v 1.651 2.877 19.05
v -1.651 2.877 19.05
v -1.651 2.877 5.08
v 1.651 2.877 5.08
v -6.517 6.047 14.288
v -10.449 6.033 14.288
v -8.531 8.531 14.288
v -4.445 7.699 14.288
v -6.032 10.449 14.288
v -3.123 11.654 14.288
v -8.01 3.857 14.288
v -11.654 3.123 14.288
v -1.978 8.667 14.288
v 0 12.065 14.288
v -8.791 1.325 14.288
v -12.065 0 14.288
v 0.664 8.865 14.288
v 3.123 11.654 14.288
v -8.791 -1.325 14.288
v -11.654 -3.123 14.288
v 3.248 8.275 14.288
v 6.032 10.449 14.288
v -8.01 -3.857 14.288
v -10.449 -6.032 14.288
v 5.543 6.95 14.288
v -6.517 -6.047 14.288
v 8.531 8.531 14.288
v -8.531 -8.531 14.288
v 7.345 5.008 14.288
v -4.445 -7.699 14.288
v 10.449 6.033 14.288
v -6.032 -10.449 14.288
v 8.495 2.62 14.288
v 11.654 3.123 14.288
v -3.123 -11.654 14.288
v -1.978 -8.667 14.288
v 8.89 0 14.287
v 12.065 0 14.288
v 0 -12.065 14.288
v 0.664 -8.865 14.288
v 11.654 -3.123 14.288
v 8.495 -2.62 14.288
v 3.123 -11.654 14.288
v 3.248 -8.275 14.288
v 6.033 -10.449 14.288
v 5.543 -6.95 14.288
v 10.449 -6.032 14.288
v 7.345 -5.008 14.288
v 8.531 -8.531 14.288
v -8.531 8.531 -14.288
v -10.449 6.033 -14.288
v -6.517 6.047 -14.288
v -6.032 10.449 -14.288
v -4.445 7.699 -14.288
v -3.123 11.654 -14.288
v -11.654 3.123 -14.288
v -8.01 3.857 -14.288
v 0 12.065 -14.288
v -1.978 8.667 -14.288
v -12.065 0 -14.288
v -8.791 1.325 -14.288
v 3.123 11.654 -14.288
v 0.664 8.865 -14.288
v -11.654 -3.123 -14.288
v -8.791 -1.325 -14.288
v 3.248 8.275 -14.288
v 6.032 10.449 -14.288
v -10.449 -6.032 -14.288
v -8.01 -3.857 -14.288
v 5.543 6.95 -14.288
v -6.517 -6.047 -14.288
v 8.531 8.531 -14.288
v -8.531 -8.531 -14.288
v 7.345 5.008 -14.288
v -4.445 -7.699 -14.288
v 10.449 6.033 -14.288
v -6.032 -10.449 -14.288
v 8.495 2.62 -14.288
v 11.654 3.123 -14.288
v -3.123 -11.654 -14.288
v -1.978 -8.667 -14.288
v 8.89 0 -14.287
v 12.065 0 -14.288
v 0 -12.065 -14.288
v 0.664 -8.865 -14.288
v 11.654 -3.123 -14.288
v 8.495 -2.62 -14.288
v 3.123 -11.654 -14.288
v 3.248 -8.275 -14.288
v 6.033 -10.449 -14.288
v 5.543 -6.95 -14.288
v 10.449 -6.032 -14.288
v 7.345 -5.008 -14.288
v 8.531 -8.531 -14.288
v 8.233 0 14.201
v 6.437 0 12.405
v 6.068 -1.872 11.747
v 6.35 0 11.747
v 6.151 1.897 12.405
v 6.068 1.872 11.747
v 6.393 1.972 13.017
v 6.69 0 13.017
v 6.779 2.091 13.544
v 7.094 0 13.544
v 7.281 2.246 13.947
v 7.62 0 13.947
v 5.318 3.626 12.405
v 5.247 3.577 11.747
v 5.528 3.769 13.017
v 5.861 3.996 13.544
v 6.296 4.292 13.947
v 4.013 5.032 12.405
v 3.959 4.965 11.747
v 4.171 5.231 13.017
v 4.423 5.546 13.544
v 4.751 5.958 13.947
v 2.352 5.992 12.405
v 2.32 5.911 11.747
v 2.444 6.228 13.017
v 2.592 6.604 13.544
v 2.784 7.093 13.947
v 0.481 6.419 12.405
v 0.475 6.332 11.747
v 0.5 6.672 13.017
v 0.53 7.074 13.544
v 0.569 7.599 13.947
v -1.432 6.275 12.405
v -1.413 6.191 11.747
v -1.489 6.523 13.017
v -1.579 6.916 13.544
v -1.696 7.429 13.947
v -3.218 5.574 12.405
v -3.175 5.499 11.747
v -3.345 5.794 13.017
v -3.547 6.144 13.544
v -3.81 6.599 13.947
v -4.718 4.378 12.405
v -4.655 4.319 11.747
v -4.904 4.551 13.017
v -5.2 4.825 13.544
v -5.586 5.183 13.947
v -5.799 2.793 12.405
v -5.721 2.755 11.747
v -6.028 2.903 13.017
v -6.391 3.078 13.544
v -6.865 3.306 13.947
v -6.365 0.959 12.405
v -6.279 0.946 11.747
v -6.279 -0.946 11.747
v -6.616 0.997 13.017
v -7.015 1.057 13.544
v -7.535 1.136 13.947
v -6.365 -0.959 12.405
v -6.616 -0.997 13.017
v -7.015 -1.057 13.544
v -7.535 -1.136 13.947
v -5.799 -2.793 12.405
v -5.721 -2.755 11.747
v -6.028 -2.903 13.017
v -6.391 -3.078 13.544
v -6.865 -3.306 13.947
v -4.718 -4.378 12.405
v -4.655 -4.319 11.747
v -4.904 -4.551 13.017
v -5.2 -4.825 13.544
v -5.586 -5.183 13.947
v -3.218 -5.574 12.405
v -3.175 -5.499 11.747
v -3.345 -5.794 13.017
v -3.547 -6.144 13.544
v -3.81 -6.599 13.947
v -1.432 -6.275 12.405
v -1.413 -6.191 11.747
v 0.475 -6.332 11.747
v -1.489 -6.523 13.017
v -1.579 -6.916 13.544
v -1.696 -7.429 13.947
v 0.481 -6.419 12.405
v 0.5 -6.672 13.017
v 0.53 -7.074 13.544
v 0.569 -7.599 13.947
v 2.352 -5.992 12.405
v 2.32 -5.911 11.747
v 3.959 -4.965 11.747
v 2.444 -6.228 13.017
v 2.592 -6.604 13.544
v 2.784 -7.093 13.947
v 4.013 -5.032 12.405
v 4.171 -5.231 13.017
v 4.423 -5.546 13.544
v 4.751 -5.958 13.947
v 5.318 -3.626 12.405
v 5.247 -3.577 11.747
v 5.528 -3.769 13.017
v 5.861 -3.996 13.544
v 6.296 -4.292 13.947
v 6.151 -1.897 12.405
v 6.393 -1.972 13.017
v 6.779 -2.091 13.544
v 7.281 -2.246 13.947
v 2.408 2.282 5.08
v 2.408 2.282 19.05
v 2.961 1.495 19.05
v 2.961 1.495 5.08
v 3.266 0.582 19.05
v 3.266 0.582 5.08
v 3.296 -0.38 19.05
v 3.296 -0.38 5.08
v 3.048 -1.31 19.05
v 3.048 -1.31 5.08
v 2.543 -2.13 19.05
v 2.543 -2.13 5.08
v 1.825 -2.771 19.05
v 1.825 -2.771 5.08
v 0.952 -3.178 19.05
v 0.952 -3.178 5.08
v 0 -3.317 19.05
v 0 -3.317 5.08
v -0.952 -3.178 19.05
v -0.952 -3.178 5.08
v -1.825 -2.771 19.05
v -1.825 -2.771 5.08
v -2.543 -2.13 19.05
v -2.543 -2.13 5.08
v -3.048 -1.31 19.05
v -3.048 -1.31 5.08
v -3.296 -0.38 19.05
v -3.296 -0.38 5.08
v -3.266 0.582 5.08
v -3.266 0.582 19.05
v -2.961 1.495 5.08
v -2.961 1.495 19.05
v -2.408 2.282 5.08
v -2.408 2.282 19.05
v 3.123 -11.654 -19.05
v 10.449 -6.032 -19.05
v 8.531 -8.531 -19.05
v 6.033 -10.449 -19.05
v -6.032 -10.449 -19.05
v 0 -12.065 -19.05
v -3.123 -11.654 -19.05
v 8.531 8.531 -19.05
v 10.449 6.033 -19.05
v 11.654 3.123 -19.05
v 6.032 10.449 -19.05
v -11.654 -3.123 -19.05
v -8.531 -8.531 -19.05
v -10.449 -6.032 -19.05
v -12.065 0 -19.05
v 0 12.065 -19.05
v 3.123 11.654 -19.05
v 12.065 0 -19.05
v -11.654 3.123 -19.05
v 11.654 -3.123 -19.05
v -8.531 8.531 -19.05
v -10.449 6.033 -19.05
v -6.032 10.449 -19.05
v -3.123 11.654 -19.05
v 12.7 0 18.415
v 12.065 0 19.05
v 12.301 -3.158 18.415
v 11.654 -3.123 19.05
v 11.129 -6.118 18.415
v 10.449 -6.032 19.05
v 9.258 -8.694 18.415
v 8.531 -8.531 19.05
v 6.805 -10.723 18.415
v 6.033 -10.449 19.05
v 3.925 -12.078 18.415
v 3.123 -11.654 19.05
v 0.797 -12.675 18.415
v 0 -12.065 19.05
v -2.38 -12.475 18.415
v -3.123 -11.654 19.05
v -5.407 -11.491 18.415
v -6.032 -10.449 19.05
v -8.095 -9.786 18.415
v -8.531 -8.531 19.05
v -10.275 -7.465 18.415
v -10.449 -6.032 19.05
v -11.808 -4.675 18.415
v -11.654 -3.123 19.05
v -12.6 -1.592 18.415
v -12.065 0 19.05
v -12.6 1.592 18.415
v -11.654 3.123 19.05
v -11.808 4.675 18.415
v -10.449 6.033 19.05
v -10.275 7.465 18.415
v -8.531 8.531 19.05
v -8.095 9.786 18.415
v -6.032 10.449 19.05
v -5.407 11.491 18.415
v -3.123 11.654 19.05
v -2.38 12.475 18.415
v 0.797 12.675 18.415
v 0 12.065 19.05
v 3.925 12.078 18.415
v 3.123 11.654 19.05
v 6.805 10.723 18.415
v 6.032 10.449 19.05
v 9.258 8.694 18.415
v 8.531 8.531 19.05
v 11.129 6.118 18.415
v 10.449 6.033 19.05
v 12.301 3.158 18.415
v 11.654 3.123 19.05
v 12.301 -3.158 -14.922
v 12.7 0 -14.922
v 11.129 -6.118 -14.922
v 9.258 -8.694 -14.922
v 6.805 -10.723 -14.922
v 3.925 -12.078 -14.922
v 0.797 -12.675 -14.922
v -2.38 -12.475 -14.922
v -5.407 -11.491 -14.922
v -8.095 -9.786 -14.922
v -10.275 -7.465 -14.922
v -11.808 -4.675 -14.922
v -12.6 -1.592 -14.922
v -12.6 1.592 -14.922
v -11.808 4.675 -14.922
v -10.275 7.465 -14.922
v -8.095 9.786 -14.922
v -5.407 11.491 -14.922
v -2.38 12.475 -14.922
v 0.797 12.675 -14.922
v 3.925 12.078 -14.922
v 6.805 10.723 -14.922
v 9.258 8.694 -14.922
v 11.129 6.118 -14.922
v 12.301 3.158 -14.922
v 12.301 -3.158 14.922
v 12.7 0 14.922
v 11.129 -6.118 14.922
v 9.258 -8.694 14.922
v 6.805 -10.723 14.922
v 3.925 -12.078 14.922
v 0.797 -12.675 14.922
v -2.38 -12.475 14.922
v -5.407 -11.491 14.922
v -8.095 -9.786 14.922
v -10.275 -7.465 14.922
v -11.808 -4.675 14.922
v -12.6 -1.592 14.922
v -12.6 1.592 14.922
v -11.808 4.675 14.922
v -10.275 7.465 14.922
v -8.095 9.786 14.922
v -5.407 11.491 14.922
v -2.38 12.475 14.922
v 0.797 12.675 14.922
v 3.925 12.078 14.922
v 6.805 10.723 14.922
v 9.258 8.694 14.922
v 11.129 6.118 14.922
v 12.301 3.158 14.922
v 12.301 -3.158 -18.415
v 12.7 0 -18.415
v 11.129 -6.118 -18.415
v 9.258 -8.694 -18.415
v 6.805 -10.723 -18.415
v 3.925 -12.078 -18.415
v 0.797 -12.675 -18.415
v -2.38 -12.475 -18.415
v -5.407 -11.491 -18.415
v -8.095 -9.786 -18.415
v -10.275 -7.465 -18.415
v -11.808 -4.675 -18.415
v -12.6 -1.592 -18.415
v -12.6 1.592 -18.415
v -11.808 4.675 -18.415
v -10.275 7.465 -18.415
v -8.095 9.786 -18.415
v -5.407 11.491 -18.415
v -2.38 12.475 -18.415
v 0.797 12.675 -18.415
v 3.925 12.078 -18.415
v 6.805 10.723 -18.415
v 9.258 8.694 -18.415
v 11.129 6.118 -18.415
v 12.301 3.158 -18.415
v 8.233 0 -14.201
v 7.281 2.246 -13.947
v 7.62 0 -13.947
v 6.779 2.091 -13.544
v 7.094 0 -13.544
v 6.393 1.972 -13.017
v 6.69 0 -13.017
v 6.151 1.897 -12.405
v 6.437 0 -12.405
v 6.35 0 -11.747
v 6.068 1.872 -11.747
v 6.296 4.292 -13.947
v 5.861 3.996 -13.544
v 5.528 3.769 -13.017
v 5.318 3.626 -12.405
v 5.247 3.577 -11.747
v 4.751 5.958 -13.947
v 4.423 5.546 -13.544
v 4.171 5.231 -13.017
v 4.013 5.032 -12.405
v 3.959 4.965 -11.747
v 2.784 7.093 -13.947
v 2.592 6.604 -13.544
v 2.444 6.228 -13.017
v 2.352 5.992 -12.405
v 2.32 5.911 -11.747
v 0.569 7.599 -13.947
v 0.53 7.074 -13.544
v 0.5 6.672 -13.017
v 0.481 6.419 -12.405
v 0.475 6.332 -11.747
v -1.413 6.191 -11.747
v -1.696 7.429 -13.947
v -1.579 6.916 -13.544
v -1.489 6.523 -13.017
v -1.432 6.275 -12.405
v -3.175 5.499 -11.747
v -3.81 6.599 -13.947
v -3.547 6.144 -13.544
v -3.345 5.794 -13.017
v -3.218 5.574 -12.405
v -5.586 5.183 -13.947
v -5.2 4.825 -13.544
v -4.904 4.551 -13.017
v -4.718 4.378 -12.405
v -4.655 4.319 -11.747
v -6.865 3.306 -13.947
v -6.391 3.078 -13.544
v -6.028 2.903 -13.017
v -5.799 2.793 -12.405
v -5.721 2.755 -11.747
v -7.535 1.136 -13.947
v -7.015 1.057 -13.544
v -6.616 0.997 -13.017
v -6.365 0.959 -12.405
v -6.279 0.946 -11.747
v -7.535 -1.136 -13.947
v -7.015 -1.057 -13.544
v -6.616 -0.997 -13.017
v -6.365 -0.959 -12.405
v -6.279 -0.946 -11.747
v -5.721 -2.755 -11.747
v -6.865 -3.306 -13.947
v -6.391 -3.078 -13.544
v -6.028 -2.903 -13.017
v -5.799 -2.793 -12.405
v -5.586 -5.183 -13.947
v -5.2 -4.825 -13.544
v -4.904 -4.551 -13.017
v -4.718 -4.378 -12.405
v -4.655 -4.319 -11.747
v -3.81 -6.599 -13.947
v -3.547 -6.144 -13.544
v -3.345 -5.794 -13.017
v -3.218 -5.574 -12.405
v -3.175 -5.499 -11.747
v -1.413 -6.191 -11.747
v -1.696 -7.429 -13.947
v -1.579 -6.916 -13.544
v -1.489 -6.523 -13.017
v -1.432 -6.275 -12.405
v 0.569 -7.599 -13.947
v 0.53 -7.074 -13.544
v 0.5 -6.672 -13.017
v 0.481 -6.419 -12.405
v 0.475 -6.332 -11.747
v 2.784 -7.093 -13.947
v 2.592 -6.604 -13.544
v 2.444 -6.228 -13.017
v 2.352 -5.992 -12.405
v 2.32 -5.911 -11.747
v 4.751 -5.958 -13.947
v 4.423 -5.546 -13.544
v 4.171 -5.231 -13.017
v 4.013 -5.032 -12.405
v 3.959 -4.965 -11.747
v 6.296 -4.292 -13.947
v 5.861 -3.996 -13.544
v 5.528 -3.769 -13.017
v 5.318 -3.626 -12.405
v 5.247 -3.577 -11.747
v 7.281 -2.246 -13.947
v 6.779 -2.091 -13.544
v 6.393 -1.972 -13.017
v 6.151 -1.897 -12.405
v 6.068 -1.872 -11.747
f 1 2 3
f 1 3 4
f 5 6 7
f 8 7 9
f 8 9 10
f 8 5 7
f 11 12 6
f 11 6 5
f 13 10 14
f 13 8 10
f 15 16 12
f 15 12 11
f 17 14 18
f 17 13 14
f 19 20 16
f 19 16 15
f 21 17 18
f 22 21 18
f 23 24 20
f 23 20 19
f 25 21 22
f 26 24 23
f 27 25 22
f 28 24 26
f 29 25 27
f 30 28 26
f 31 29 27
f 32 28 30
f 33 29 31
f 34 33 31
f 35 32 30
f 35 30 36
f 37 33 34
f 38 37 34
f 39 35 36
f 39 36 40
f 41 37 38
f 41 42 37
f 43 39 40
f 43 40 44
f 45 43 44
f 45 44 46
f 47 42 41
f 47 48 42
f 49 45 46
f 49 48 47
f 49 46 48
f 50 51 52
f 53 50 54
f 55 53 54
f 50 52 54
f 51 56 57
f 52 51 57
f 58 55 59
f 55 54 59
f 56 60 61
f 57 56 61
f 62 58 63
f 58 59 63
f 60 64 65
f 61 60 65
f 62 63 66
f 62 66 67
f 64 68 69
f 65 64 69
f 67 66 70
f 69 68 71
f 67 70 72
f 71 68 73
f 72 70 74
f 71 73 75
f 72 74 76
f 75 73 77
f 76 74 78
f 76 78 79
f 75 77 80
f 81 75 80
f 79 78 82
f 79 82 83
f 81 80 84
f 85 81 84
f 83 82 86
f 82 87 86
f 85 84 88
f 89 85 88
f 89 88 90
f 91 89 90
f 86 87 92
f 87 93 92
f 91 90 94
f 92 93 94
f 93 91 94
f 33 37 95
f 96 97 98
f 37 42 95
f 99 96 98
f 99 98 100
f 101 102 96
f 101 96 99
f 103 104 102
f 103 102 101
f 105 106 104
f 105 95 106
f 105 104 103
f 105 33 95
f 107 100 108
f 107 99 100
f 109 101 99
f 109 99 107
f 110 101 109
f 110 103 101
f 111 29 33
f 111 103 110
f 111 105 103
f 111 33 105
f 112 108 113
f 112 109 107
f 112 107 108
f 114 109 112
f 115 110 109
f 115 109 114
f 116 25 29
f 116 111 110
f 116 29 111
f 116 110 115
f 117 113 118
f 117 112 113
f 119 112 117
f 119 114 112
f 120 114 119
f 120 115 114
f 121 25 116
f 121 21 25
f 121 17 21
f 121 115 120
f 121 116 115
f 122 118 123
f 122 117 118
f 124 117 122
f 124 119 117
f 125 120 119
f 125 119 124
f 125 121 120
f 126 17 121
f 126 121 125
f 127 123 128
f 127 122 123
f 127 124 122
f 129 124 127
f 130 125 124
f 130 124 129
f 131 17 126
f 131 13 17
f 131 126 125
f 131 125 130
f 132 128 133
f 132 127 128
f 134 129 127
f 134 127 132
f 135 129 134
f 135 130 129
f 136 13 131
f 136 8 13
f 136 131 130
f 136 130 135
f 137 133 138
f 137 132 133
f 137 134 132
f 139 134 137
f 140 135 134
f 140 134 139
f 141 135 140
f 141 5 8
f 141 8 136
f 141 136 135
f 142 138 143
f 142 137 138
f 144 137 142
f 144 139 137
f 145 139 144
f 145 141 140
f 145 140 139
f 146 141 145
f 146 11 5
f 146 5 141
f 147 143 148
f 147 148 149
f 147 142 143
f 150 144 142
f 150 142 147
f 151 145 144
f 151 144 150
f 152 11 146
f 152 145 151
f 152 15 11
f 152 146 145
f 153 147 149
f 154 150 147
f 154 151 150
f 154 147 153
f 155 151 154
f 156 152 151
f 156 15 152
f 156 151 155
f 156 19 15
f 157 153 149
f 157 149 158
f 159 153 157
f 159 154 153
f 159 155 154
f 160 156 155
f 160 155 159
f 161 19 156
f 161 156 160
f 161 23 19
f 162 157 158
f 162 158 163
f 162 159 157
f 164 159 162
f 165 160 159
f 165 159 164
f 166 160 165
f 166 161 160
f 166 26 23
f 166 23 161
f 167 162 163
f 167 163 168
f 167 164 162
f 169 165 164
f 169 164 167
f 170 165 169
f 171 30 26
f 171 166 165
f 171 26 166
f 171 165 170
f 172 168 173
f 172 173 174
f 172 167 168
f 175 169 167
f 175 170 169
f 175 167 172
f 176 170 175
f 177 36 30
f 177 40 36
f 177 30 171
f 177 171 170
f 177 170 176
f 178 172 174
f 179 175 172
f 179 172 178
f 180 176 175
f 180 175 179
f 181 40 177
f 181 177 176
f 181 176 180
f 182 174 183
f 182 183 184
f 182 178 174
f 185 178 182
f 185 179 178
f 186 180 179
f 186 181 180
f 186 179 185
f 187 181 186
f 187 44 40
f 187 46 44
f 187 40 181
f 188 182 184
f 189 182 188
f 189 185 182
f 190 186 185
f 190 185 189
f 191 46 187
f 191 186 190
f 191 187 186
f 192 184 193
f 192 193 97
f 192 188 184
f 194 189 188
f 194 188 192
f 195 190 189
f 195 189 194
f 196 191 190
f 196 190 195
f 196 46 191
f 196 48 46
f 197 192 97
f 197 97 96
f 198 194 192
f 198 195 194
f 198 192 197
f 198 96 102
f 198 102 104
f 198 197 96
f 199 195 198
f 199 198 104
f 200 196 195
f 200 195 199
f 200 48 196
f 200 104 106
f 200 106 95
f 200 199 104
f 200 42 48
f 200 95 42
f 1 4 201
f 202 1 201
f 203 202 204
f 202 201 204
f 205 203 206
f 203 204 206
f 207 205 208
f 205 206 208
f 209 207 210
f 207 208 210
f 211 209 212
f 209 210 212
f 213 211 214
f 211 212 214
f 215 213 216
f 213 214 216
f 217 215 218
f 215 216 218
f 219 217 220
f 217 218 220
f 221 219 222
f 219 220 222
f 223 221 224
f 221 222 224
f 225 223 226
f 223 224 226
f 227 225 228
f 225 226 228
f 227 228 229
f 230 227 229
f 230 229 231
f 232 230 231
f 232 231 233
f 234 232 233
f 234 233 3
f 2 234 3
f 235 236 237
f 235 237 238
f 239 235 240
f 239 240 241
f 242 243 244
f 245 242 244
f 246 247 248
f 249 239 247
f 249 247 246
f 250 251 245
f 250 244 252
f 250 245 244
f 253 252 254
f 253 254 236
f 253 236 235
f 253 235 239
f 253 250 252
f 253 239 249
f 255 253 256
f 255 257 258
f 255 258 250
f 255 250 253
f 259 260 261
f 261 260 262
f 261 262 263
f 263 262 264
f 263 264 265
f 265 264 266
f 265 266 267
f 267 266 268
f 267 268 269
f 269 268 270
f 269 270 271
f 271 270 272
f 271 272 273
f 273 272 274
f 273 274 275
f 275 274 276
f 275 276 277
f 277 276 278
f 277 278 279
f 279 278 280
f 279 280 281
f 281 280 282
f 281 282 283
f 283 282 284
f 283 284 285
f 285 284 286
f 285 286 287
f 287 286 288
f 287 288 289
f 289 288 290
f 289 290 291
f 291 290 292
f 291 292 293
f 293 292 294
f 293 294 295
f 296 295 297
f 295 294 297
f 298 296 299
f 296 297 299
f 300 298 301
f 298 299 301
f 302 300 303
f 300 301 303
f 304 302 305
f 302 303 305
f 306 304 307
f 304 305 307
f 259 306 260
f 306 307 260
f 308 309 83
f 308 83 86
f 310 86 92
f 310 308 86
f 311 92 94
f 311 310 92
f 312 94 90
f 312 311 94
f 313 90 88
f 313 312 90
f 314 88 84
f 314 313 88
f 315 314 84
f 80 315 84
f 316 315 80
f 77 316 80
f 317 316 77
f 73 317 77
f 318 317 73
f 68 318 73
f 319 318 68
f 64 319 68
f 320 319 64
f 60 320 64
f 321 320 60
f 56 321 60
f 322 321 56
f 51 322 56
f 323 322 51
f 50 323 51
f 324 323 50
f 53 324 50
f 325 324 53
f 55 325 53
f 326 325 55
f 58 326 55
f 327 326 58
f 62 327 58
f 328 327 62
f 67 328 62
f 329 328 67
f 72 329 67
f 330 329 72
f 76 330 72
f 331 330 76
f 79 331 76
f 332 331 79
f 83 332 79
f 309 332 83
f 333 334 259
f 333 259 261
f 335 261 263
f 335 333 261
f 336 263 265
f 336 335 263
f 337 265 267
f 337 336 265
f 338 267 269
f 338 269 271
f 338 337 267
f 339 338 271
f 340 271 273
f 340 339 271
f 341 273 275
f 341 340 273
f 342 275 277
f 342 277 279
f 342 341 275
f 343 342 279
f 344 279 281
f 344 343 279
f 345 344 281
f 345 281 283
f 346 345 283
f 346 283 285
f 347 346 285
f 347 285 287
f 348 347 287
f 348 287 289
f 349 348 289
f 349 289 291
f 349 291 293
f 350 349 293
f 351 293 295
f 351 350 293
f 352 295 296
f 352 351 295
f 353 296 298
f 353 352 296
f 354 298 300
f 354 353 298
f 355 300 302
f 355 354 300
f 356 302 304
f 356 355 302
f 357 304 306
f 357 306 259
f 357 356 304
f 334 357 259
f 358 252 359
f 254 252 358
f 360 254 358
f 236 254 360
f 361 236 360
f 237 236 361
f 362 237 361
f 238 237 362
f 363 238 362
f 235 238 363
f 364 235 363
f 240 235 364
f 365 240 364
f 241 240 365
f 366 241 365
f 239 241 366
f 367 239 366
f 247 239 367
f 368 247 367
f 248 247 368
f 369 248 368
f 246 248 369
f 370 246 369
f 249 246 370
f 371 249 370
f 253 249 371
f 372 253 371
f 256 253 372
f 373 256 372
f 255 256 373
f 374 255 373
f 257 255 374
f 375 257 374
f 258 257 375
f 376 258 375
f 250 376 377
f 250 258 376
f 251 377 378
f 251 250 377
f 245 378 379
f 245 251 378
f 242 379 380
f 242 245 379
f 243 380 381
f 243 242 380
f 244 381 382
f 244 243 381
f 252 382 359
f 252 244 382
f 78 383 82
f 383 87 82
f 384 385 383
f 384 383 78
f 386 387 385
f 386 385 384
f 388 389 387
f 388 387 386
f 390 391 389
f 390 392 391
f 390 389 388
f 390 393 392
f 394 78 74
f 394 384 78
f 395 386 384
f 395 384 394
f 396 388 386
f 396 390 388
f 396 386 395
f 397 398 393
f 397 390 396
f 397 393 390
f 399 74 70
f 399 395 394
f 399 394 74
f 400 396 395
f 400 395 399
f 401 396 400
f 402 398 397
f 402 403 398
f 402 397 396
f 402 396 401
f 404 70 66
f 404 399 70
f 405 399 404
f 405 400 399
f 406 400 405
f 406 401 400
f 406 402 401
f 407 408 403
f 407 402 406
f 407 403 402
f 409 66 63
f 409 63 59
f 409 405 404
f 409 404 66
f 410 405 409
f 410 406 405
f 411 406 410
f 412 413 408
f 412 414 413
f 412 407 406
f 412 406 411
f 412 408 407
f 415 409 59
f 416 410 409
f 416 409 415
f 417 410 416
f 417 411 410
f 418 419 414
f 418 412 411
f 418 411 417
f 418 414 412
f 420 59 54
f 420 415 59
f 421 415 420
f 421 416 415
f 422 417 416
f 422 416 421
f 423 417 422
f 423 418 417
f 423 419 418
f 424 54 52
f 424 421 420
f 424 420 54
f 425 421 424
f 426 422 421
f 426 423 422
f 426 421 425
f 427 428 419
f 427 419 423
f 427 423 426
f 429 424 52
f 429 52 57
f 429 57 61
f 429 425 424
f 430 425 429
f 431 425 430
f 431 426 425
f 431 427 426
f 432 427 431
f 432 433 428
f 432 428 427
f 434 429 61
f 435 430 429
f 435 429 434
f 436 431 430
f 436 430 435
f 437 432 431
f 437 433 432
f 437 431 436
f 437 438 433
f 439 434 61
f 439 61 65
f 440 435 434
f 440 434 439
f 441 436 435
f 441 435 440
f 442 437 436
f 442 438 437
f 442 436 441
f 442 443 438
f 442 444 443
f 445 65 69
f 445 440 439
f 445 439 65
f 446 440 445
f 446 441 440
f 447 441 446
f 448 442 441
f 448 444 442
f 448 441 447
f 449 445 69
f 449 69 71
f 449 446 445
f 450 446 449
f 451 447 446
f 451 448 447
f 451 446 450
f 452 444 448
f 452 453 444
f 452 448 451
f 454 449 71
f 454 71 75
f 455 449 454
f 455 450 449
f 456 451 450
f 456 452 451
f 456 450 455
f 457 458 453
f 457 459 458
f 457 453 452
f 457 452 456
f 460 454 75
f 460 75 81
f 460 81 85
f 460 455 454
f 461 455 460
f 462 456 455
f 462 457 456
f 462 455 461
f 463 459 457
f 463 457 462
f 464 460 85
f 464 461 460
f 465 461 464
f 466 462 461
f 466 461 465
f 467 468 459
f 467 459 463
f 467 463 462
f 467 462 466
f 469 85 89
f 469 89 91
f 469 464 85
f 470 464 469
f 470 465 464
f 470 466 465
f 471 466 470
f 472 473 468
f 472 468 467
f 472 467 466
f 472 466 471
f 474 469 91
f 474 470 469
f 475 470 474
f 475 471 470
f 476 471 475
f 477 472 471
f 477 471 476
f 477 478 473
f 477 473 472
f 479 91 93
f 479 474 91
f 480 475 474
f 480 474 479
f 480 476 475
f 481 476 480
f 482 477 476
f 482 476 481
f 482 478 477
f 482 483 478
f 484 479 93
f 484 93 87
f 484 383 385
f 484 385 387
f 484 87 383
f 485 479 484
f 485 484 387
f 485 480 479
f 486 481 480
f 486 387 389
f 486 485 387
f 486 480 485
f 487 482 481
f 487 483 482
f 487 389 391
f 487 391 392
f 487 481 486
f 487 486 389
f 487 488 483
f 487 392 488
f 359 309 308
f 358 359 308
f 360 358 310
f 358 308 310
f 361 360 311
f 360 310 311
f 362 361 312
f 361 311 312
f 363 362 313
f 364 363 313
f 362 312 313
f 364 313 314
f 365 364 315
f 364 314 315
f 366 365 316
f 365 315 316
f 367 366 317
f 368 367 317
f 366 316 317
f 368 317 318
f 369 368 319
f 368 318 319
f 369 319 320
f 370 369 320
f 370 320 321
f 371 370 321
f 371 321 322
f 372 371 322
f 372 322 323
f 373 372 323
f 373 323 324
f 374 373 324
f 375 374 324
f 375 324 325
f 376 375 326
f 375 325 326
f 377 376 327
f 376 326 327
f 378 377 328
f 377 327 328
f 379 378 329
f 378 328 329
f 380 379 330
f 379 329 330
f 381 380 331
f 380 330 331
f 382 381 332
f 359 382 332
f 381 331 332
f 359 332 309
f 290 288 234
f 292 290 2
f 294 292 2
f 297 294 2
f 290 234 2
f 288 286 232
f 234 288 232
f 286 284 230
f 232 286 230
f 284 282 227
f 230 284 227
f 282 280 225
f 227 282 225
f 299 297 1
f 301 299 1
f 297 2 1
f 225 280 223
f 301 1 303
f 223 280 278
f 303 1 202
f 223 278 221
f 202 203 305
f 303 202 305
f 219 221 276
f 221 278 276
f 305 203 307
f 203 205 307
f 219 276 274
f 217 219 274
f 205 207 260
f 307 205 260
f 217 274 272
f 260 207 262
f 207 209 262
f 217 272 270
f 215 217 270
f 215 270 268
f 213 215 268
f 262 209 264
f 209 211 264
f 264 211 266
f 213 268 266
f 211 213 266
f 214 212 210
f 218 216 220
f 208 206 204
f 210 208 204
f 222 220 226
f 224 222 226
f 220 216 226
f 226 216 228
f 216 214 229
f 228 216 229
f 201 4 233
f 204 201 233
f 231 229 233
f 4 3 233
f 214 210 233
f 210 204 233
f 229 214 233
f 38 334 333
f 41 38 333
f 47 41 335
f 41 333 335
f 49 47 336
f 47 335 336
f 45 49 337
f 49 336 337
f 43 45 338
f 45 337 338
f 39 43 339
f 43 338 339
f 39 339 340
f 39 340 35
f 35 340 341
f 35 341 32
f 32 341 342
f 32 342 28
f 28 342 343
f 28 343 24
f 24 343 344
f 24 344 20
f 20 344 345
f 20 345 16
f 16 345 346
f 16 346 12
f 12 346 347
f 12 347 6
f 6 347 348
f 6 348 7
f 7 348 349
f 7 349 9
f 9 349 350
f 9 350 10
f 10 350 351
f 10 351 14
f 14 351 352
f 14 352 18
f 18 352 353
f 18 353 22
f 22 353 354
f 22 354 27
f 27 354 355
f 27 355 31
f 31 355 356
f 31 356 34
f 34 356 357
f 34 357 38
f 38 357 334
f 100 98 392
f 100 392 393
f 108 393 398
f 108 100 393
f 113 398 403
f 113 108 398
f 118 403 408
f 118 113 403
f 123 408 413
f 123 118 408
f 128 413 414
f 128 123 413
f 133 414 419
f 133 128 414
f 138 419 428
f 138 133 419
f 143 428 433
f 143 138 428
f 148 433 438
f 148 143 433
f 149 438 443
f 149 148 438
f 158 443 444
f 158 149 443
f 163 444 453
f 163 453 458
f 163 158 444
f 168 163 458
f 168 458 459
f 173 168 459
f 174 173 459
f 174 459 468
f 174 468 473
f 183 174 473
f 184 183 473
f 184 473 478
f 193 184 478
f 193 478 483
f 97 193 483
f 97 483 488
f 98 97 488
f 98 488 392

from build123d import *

# Parameters (mm, degrees)
SKETCH1_R                = 6.35
SKETCH1_R_2              = 3.317499969
BOSS_EXTRUDE1_DEPTH      = 14.2875
BOSS_EXTRUDE1_DEPTH_BACK = 14.2875
SKETCH2_R                = 12.7
SKETCH2_R_2              = 6.35
SKETCH2_R_3              = 3.317499969
BOSS_EXTRUDE3_DEPTH      = 4.7625
SKETCH3_R                = 3.317499969
BOSS_EXTRUDE4_DEPTH      = 24.13
FILLET1_R                = 2.54
CHAMFER1_SIZE            = 0.635
BOSS_EXTRUDE5_REACH      = 44.121


with BuildPart() as part:
    # Sketch1 → Boss-Extrude1 (new, two sides)
    with BuildSketch(Plane.XY) as boss_extrude1_sk:
        Circle(SKETCH1_R)
        Circle(SKETCH1_R_2, mode=Mode.SUBTRACT)
    extrude(amount=BOSS_EXTRUDE1_DEPTH)
    extrude(boss_extrude1_sk.sketch, amount=-BOSS_EXTRUDE1_DEPTH_BACK)

    # Sketch2 → Boss-Extrude3 (add)
    with BuildSketch(Plane(origin=(0, 0, -14.2875), x_dir=(-1, 0, 0), z_dir=(0, 0, -1))):
        with Locations(Location((0, 0, 0), (0, 0, 180))):
            Circle(SKETCH2_R)
        with Locations(Location((0, 0, 0), (0, 0, 180))):
            Circle(SKETCH2_R_2, mode=Mode.SUBTRACT)
        with Locations(Location((0, 0, 0), (0, 0, 180))):
            Circle(SKETCH2_R_2)
        with Locations(Location((0, 0, 0), (0, 0, 180))):
            Circle(SKETCH2_R_3, mode=Mode.SUBTRACT)
    boss_extrude3 = extrude(amount=BOSS_EXTRUDE3_DEPTH)

    # Mirror1: Boss-Extrude3 across plane
    add(boss_extrude3.mirror(Plane.XY))

    # Sketch3 → Boss-Extrude4 (add)
    with BuildSketch(Plane(origin=(0, 0, -19.05), x_dir=(-1, 0, 0), z_dir=(0, 0, -1))):
        Circle(SKETCH3_R)
    extrude(amount=-BOSS_EXTRUDE4_DEPTH)

    # Fillet1
    fillet1_edges = [part.edges().sort_by_distance(p)[0] for p in [
        (-6.35, 0, -14.2875),
        (-6.35, 0, 14.2875),
    ]]
    fillet(fillet1_edges, radius=FILLET1_R)

    # Chamfer1
    chamfer1_edges = [part.edges().sort_by_distance(p)[0] for p in [
        (-12.7, 0, -14.2875),
        (-12.7, 0, -19.05),
        (-12.7, 0, 19.05),
        (-12.7, 0, 14.2875),
    ]]
    chamfer(chamfer1_edges, length=CHAMFER1_SIZE)

    # Sketch4 → Boss-Extrude5 (add, up to next)
    with BuildSketch(Plane.XY.offset(19.05), mode=Mode.PRIVATE) as boss_extrude5_sk1:
        with BuildLine():
            ThreePointArc((1.651, 2.87749979), (0, 3.317499969), (-1.651, 2.87749979))
            Line((-1.651, 2.87749979), (1.651, 2.87749979))
        make_face()
    boss_extrude5_tool1 = extrude(boss_extrude5_sk1.sketch, amount=-BOSS_EXTRUDE5_REACH, mode=Mode.PRIVATE) - part.part
    add(boss_extrude5_tool1.solids().sort_by_distance((0, 3.05454, 19.05))[0])


solid = part.part
